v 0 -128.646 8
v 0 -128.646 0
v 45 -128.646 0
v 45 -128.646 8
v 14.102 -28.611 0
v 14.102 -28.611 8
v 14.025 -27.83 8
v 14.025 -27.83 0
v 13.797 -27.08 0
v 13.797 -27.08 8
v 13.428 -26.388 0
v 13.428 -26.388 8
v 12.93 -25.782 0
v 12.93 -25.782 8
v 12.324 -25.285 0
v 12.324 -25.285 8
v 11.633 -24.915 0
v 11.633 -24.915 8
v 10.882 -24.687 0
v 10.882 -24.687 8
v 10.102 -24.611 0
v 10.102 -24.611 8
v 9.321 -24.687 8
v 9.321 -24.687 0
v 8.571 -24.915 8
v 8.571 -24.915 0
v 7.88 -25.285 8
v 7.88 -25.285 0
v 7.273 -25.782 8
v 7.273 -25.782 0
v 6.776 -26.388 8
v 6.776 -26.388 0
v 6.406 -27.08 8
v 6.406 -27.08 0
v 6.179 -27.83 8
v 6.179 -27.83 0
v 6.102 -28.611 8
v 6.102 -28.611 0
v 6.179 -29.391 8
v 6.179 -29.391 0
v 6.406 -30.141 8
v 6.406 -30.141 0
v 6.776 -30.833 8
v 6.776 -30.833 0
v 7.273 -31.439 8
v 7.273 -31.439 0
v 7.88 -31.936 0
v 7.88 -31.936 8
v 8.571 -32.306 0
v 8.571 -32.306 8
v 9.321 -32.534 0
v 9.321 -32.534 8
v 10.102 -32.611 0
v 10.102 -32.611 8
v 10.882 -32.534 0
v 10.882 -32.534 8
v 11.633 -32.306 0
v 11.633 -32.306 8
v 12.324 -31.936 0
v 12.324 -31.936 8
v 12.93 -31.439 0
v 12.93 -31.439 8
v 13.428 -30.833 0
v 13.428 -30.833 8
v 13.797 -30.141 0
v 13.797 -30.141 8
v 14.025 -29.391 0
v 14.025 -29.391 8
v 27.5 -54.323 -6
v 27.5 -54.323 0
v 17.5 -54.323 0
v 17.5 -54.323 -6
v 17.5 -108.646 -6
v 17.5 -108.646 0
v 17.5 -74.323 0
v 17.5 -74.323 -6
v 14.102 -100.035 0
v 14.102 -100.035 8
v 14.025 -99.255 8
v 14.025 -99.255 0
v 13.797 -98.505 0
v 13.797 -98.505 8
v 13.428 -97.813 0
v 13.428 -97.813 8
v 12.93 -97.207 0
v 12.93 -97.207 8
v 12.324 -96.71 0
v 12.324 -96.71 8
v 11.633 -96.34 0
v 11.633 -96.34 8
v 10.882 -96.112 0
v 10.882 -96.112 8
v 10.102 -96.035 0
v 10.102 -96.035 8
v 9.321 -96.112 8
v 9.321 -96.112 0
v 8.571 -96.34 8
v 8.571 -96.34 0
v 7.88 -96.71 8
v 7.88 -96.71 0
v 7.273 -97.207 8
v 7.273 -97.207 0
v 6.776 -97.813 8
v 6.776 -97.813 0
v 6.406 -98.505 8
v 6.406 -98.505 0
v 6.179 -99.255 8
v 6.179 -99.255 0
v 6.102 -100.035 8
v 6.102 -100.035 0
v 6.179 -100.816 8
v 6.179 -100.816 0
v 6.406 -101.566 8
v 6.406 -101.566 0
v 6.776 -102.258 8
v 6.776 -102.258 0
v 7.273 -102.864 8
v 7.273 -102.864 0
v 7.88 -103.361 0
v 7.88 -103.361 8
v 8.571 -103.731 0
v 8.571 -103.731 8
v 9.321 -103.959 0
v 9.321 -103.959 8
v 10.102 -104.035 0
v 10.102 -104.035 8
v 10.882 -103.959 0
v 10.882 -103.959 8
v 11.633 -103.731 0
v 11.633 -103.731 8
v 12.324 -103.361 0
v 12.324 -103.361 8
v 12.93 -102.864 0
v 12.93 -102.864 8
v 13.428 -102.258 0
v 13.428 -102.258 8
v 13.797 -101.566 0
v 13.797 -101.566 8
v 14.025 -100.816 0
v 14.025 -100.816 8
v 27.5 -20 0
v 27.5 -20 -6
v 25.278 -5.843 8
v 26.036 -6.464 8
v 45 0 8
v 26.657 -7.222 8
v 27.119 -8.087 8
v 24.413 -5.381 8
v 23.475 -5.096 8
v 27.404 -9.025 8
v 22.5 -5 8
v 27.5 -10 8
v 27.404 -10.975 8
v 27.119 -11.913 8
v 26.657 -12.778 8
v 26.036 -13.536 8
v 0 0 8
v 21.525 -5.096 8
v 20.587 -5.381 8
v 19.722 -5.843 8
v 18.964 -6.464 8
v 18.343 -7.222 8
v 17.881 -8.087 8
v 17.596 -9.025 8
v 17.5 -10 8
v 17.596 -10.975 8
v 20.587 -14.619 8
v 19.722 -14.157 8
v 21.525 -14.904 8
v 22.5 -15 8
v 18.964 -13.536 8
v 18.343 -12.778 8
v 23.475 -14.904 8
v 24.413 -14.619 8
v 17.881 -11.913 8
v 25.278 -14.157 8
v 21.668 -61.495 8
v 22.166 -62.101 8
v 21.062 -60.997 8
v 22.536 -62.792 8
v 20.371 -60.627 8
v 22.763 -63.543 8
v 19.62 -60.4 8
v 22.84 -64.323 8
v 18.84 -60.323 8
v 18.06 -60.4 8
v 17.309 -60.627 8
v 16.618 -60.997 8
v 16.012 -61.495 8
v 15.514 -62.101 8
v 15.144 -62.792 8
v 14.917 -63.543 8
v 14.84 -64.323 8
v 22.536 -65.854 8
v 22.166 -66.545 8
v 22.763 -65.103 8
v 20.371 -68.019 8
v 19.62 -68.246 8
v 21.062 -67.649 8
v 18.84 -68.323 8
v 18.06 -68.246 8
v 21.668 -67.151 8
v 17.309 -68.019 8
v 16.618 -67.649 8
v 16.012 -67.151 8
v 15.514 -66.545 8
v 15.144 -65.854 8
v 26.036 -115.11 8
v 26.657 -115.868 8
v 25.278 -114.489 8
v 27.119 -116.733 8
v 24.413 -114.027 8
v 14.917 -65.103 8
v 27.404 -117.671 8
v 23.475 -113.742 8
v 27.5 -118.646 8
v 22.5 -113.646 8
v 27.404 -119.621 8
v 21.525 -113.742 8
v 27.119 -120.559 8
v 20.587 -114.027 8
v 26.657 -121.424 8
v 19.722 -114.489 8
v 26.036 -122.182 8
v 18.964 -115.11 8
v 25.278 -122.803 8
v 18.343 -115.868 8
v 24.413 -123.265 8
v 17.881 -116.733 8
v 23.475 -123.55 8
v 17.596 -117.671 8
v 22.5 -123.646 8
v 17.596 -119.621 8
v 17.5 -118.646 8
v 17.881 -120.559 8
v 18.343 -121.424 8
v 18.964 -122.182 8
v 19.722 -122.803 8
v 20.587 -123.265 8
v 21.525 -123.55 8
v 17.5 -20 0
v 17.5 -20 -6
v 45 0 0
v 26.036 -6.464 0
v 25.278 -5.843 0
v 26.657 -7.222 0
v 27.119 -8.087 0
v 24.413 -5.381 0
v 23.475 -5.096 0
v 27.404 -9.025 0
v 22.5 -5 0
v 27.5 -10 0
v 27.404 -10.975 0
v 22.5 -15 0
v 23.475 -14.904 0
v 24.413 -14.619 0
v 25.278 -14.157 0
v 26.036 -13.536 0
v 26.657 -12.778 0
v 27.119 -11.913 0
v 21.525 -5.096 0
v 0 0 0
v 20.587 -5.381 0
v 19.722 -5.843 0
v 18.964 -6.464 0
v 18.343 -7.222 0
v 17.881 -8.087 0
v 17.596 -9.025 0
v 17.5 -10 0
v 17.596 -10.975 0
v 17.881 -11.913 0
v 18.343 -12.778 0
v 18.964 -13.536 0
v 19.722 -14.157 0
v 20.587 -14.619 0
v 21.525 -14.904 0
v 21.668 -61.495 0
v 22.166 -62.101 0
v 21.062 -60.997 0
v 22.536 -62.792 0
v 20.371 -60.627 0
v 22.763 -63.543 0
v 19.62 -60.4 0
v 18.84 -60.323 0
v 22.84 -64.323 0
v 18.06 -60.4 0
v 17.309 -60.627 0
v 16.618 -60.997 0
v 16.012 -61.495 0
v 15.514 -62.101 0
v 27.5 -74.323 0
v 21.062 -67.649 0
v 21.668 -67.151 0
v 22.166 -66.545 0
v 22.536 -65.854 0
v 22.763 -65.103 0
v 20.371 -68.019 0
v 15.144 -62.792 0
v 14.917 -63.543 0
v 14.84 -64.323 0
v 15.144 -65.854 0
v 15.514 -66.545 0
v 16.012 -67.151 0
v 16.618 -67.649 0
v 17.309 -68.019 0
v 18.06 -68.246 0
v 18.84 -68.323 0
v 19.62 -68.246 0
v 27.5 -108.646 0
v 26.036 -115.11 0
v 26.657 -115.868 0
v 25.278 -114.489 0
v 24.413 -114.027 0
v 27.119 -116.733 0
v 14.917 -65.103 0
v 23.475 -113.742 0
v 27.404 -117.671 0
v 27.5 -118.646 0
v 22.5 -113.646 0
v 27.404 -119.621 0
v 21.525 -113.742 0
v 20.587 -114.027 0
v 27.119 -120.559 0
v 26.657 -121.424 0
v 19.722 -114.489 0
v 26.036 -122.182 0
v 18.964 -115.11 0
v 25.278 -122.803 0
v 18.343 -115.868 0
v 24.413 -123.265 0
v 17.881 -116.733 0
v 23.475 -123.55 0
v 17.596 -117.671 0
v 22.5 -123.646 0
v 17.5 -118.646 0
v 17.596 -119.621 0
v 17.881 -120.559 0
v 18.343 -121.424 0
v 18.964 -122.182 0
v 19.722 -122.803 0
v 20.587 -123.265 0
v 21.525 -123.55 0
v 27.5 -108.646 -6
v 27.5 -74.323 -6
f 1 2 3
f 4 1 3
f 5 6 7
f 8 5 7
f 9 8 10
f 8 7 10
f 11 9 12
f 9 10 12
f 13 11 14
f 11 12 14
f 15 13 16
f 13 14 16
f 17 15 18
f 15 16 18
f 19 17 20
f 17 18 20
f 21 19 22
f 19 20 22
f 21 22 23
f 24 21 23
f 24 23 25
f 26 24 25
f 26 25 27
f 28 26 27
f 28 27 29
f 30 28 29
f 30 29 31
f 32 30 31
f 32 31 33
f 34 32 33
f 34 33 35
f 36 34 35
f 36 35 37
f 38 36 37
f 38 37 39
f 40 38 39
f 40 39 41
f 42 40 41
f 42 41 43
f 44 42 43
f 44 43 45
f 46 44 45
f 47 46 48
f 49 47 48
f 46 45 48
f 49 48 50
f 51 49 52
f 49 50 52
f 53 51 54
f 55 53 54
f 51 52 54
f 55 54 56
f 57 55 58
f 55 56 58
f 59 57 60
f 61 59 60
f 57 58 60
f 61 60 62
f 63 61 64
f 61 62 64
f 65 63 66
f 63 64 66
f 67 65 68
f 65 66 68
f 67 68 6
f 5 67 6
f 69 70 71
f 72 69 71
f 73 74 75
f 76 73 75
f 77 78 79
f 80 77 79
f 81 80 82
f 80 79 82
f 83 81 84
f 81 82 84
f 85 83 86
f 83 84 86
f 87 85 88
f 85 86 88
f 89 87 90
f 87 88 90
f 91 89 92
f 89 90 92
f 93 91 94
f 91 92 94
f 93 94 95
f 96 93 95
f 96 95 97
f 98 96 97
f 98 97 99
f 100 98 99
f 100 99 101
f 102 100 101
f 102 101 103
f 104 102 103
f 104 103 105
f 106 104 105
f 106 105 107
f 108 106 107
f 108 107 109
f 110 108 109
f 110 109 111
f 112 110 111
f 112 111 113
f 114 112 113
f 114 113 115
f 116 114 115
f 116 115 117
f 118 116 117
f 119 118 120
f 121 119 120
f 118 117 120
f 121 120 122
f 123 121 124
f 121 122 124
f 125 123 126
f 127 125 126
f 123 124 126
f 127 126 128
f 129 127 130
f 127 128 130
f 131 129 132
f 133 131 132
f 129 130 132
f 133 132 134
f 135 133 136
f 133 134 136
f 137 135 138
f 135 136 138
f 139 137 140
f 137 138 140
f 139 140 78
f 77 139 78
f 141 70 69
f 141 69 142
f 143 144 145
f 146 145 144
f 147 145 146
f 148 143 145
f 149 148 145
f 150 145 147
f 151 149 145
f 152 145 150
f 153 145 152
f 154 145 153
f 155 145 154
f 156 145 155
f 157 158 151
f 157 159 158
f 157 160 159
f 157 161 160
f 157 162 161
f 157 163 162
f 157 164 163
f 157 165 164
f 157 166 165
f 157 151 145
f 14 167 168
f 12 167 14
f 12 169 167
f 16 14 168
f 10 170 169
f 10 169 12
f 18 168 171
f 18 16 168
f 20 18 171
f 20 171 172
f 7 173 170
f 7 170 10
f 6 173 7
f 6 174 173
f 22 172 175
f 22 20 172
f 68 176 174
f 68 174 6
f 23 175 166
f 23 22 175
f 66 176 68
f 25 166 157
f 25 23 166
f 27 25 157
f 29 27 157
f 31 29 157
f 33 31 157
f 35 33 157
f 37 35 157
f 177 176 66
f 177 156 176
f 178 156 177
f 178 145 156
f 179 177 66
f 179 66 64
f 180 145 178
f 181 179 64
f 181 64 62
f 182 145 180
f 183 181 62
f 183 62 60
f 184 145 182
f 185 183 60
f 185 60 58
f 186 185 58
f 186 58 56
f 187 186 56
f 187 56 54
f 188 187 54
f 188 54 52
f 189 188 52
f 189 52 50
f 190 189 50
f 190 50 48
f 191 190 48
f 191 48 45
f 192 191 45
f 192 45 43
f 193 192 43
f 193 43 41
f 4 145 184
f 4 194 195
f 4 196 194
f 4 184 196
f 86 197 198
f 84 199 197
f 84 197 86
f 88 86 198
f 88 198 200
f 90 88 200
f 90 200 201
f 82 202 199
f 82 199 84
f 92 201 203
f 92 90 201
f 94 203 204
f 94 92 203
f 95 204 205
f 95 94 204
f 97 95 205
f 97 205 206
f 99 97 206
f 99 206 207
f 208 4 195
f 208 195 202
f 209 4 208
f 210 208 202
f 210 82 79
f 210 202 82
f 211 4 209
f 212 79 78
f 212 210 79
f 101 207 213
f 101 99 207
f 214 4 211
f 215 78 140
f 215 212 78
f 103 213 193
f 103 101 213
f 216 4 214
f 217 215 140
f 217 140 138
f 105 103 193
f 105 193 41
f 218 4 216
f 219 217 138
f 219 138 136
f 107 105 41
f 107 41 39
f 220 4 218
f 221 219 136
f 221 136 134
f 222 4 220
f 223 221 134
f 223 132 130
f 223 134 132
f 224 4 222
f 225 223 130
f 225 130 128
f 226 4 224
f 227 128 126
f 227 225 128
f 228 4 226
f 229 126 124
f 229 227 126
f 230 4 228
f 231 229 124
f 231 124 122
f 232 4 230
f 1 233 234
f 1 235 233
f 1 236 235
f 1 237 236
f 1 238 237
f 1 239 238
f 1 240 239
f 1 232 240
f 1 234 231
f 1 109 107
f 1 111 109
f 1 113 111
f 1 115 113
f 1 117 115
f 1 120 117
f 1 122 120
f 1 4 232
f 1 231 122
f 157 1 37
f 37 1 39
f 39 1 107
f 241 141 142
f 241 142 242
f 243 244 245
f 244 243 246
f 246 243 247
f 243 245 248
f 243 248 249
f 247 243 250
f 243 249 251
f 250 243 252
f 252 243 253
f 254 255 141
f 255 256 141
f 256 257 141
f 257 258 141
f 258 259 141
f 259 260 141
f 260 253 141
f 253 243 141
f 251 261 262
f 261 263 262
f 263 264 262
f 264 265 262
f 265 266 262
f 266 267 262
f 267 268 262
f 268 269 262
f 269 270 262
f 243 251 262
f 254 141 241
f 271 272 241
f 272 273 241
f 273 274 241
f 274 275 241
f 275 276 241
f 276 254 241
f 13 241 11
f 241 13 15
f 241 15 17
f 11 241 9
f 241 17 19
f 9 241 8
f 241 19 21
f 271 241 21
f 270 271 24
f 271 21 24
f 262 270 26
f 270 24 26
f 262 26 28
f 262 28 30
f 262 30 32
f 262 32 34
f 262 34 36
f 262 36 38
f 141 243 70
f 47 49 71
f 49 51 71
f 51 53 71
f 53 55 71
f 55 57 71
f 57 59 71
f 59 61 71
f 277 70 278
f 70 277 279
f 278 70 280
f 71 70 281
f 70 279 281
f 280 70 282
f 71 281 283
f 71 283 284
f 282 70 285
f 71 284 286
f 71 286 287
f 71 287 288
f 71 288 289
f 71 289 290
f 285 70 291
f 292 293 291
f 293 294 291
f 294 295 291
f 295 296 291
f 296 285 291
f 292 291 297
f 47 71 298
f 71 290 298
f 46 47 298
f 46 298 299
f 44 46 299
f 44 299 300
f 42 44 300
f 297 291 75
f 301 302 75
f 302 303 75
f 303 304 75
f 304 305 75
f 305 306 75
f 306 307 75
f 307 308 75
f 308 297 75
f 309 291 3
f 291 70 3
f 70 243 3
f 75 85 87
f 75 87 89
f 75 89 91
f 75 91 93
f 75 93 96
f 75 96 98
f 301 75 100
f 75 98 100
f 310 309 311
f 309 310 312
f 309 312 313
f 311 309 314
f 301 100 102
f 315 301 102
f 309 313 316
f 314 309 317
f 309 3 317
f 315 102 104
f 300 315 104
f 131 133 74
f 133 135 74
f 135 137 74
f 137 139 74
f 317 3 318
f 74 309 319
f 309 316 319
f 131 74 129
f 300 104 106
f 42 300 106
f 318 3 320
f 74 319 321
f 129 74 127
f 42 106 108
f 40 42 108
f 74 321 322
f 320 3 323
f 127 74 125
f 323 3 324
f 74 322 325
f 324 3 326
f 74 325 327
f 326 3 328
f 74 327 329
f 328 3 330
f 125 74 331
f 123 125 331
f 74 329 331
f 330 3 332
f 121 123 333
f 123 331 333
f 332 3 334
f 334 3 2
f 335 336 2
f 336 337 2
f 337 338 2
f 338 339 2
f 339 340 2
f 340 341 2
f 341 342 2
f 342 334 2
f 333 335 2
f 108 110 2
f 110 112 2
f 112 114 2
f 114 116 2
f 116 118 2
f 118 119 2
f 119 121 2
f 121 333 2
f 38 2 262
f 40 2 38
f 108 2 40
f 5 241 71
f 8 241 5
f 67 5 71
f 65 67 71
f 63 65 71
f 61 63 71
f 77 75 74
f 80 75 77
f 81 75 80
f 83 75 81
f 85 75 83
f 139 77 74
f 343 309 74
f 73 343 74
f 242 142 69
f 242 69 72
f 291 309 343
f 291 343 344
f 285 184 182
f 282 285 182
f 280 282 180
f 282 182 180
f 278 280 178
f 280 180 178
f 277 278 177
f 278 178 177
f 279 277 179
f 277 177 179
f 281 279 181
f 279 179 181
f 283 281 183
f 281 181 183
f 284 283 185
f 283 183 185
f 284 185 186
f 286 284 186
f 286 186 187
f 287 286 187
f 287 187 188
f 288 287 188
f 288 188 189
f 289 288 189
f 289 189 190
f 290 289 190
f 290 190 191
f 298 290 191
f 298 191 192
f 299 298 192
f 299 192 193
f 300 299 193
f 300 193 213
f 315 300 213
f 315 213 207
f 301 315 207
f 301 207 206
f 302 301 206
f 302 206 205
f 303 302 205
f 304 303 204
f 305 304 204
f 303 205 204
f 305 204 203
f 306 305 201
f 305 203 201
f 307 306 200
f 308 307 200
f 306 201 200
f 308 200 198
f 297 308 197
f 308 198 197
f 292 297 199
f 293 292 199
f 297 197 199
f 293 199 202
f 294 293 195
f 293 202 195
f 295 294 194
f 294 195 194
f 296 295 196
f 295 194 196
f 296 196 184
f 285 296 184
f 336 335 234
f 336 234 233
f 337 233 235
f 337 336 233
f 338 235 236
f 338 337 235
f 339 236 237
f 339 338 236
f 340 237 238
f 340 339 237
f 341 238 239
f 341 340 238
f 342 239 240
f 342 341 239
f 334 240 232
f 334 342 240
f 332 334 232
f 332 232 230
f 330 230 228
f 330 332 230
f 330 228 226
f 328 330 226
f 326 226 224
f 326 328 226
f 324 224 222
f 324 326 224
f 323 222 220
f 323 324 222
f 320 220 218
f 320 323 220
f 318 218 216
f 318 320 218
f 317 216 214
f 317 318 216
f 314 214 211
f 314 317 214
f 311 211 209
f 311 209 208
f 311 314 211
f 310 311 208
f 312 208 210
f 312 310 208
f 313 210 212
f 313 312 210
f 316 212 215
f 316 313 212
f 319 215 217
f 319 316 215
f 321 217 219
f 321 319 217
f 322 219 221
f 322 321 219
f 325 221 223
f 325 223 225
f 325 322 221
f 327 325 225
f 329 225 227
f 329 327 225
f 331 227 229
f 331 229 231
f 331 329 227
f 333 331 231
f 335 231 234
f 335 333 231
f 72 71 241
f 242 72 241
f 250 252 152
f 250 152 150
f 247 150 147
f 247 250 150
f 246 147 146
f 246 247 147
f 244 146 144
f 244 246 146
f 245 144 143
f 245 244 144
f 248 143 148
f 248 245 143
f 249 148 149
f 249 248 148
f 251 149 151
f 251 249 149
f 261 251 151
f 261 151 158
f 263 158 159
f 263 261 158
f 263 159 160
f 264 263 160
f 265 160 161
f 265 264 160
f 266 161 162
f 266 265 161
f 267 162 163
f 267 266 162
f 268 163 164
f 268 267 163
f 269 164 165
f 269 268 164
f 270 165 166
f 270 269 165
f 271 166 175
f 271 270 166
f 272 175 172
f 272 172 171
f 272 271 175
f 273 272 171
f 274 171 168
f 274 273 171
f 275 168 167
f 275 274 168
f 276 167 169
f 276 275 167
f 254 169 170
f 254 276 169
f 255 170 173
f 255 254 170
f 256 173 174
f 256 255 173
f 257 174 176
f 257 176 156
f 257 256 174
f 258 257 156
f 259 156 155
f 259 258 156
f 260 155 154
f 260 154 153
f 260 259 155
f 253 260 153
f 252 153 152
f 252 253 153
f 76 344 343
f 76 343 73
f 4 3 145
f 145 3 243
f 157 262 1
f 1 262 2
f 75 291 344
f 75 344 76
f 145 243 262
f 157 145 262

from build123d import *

# Parameters (mm, degrees)
ESQUISSE2_R             = 5
BOSS_EXTRU_2_DEPTH      = 8
ESQUISSE3_W             = 10
ESQUISSE3_H             = 34.323
BOSS_EXTRU_3_DEPTH      = 6
ENL_V_MAT_EXTRU_1_REACH = 139.007
ESQUISSE4_R             = 4


with BuildPart() as part:
    # Esquisse2 → Boss.-Extru.2 (new body)
    with BuildSketch(Plane(origin=(0, 0, 0), x_dir=(-1, 0, 0), z_dir=(0, 0, 1))):
        Polygon((-45, 128.646), (-45, 0), (-5, 0), (0, 0), (0, 64.323), (0, 128.646), (-5.55, 128.646), align=None)
        with Locations(Location((-22.5, 10, 0), (0, 0, 180))):
            Circle(ESQUISSE2_R, mode=Mode.SUBTRACT)
        with Locations((-22.5, 118.646)):
            Circle(ESQUISSE2_R, mode=Mode.SUBTRACT)
    extrude(amount=BOSS_EXTRU_2_DEPTH)

    # Esquisse3 → Boss.-Extru.3 (add)
    with BuildSketch(Plane(origin=(0, 0, 0), x_dir=(-1, 0, 0), z_dir=(0, 0, -1))):
        with Locations((-22.5, -91.4845)):
            Rectangle(ESQUISSE3_W, ESQUISSE3_H)
        with Locations((-22.5, -37.1615)):
            Rectangle(ESQUISSE3_W, ESQUISSE3_H)
    extrude(amount=BOSS_EXTRU_3_DEPTH)

    # Esquisse4 → Enlèv. mat.-Extru.1 (cut, up to next)
    with BuildSketch(Plane.XY.offset(8), mode=Mode.PRIVATE) as enl_v_mat_extru_1_sk1:
        with Locations((10.1018, -28.6106)):
            Circle(ESQUISSE4_R)
    enl_v_mat_extru_1_tool1 = extrude(enl_v_mat_extru_1_sk1.sketch, amount=-ENL_V_MAT_EXTRU_1_REACH, mode=Mode.PRIVATE) & part.part
    # Esquisse4 → Enlèv. mat.-Extru.1 (cut, up to next)
    with BuildSketch(Plane.XY.offset(8), mode=Mode.PRIVATE) as enl_v_mat_extru_1_sk2:
        with Locations((10.1018, -100.0354)):
            Circle(ESQUISSE4_R)
    enl_v_mat_extru_1_tool2 = extrude(enl_v_mat_extru_1_sk2.sketch, amount=-ENL_V_MAT_EXTRU_1_REACH, mode=Mode.PRIVATE) & part.part
    # Esquisse4 → Enlèv. mat.-Extru.1 (cut, up to next)
    with BuildSketch(Plane.XY.offset(8), mode=Mode.PRIVATE) as enl_v_mat_extru_1_sk3:
        with Locations((18.84, -64.323)):
            Circle(ESQUISSE4_R)
    enl_v_mat_extru_1_tool3 = extrude(enl_v_mat_extru_1_sk3.sketch, amount=-ENL_V_MAT_EXTRU_1_REACH, mode=Mode.PRIVATE) & part.part
    add(enl_v_mat_extru_1_tool1.solids().sort_by_distance((10.1018, -28.6106, 8))[0], mode=Mode.SUBTRACT)
    add(enl_v_mat_extru_1_tool2.solids().sort_by_distance((10.1018, -100.0354, 8))[0], mode=Mode.SUBTRACT)
    add(enl_v_mat_extru_1_tool3.solids().sort_by_distance((18.84, -64.323, 8))[0], mode=Mode.SUBTRACT)


solid = part.part
